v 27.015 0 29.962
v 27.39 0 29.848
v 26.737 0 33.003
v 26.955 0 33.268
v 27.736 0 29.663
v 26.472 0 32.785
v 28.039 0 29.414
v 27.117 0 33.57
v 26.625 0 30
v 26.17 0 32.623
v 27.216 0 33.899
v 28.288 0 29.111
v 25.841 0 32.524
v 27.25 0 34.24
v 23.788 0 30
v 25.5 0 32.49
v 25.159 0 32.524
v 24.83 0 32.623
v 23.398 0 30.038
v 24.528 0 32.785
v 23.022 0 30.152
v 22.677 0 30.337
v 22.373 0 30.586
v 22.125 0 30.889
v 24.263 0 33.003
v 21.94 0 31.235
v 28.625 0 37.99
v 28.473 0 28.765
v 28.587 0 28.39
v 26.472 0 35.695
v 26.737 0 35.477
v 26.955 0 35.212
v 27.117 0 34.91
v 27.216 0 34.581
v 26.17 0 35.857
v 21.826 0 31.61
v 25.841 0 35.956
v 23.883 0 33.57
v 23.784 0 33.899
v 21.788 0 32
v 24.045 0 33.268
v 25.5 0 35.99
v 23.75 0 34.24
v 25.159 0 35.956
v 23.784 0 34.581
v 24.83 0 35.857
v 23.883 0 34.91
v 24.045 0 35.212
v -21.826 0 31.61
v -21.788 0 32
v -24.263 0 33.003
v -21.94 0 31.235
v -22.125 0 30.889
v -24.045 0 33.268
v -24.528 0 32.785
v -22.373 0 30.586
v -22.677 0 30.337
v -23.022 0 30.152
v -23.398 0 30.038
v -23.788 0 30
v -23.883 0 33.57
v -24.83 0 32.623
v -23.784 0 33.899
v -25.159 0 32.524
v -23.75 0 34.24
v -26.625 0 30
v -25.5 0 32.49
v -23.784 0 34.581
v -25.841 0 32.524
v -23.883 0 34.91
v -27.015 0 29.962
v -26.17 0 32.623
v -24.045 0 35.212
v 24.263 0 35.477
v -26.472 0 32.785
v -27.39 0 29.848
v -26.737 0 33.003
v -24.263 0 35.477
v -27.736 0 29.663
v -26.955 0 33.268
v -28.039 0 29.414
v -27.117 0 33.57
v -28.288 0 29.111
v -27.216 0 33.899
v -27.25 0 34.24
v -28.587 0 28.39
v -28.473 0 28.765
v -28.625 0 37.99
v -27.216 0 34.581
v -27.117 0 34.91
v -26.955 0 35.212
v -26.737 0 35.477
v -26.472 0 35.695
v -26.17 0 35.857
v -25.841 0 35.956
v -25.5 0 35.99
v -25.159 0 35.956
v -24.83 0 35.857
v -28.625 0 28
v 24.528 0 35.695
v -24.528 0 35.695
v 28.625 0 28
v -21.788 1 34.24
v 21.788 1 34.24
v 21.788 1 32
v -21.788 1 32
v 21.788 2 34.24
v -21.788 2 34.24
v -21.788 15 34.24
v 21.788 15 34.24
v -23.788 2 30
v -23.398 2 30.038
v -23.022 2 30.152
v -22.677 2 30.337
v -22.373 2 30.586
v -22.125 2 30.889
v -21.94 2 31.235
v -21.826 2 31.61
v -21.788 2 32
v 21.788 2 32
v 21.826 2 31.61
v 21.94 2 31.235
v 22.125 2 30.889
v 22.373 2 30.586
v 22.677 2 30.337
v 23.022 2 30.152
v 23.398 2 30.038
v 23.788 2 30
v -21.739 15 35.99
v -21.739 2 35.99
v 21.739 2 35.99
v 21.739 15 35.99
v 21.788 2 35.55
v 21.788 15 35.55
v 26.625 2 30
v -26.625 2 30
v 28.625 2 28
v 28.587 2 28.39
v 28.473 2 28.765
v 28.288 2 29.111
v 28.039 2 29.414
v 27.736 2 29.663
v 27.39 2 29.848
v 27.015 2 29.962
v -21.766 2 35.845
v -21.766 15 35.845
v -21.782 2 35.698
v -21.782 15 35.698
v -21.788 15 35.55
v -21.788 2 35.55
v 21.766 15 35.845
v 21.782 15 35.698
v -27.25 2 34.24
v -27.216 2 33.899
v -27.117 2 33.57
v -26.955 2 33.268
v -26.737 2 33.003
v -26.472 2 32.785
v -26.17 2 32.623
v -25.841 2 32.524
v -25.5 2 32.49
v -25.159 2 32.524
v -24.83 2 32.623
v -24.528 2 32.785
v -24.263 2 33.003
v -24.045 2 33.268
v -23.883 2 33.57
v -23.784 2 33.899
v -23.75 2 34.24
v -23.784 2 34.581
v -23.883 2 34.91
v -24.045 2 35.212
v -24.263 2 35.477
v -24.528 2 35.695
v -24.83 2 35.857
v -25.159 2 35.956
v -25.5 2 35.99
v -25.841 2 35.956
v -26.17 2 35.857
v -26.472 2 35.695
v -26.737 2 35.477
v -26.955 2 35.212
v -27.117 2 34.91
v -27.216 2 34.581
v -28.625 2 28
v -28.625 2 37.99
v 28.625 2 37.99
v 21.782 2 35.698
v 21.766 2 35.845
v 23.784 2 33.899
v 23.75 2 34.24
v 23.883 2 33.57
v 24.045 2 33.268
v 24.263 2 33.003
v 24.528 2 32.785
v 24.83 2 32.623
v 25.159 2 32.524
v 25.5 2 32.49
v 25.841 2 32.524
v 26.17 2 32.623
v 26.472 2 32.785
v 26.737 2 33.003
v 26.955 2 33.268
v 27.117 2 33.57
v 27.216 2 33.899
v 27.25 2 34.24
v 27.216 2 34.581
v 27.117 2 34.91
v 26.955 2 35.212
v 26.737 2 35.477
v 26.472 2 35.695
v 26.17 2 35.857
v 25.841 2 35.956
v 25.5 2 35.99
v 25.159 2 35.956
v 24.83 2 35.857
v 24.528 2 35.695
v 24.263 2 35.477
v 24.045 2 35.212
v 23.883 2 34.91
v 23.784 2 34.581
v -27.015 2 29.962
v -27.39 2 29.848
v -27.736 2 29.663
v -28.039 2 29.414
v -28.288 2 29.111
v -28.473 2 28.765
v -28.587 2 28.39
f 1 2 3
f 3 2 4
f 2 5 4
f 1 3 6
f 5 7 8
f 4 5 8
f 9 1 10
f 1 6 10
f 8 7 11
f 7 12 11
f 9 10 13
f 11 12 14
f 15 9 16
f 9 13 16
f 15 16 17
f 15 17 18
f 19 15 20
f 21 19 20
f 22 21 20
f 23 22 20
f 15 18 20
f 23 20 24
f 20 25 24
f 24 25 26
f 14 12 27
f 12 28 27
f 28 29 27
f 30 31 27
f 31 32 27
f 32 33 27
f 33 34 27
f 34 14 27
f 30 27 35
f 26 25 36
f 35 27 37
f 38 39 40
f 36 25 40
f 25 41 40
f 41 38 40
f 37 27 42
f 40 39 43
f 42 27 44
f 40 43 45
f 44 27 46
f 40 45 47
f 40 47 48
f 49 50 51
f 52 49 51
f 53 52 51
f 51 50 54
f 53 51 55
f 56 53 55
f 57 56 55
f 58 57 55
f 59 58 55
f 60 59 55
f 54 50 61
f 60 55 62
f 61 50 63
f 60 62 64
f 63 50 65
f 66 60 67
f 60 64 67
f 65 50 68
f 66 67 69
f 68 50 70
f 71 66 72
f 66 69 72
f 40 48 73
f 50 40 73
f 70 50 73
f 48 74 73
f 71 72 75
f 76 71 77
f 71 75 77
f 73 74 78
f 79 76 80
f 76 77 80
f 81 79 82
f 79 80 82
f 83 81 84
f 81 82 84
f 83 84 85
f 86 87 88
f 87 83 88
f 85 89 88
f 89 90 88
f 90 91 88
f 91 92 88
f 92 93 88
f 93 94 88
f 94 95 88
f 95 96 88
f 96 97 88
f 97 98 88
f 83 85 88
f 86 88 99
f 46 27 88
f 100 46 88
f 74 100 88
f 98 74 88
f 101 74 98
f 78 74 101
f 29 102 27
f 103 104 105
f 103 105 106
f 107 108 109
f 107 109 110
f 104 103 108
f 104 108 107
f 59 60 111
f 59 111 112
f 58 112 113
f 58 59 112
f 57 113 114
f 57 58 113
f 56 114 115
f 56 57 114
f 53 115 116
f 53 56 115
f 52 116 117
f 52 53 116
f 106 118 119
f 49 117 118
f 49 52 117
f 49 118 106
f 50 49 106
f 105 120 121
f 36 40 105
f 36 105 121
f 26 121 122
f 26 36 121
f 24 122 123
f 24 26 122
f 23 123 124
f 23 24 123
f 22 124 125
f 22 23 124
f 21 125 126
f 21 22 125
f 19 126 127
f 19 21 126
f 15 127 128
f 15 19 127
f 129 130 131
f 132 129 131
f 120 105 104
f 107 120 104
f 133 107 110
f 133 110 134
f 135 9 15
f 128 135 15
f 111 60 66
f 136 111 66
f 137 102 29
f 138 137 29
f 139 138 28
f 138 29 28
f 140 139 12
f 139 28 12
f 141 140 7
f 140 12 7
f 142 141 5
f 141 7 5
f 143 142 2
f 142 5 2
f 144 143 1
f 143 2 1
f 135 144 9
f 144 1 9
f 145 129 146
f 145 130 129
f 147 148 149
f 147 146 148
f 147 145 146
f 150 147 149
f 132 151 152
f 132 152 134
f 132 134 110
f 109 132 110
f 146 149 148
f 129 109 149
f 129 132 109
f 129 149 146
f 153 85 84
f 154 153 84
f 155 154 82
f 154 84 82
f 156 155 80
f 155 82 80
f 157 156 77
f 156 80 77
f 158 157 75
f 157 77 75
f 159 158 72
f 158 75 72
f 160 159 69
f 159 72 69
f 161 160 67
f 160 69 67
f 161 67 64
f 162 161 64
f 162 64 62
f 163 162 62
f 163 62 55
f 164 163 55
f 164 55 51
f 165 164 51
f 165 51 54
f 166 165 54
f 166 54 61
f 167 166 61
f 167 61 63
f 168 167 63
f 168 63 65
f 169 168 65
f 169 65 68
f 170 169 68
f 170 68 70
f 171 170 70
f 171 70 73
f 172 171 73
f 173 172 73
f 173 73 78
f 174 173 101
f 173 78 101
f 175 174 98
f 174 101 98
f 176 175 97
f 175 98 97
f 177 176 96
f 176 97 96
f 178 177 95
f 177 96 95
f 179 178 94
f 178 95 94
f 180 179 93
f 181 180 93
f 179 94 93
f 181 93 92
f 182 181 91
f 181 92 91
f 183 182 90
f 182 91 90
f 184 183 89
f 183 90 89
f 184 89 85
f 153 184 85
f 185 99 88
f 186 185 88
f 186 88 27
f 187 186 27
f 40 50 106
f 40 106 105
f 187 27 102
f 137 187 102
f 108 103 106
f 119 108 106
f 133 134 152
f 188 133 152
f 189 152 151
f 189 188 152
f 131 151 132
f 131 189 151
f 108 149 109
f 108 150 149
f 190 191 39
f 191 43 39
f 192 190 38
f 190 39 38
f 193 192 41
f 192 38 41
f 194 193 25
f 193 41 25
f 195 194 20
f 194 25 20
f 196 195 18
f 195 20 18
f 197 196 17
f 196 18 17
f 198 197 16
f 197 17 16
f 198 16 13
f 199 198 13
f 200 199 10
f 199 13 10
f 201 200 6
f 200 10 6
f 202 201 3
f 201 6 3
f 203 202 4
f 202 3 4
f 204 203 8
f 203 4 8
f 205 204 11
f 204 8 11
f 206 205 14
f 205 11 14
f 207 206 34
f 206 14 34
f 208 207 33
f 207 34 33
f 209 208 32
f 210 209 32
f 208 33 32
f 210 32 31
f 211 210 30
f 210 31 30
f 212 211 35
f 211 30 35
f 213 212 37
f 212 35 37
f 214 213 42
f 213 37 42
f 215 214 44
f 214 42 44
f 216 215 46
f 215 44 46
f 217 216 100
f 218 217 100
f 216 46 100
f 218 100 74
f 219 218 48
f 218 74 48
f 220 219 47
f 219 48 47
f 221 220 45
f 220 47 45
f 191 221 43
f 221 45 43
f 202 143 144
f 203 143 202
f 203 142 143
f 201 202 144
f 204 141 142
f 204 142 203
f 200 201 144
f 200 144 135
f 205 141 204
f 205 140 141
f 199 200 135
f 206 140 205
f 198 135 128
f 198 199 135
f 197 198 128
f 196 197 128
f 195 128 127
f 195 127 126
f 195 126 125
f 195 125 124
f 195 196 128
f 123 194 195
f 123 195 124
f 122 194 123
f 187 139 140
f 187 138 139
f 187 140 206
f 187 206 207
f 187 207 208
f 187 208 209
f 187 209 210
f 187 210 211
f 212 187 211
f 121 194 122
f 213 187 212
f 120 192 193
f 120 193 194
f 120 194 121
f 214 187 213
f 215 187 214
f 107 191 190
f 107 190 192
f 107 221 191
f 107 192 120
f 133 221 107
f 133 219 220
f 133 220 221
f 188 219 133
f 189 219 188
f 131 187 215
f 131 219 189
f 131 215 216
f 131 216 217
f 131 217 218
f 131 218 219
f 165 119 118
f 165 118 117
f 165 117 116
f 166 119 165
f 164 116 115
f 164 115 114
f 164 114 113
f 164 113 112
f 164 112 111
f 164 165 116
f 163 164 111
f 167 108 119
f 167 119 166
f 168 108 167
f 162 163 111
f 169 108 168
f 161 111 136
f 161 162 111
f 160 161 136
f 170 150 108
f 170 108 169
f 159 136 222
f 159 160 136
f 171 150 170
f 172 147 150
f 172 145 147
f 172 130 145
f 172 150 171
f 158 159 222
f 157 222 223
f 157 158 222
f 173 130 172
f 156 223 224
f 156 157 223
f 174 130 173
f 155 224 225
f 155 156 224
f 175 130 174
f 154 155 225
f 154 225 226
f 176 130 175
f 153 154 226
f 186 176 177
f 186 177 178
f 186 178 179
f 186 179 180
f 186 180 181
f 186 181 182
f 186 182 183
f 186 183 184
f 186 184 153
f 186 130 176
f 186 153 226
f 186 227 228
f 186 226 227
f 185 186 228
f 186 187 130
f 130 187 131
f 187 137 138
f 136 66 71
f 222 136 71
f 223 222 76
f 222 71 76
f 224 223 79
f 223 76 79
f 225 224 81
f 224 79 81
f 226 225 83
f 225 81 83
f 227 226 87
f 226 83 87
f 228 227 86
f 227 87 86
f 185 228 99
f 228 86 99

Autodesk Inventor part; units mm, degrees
ref_plane "YZ Plane" through (0, 0, 0) normal (1, 0, 0) x (0, 1, 0)
ref_plane "XZ Plane" through (0, 0, 0) normal (0, 1, 0) x (-1, 0, 0)
ref_plane "XY Plane" through (0, 0, 0) normal (0, 0, 1) x (1, 0, 0)
sketch "Sketch1" plane through (0, 0, 0) normal (0, 1, 0) x (-1, 0, 0)
  circle A0 centre (25.5, 34.24) radius 1.75
  circle A1 centre (-25.5, 34.24) radius 1.75
  line L0 (23.7877, 30) -> (26.625, 30)
  arc A2 (21.7877, 32) -> (23.7877, 30) centre (23.7877, 32) ccw
  line L1 (21.7877, 35.55) -> (21.7877, 32)
  arc A3 (21.7877, 35.55) -> (21.7387, 35.99) centre (19.7877, 35.55) ccw
  arc A4 (28.625, 28) -> (26.625, 30) centre (26.625, 28) ccw
  line L2 (-21.7877, 32) -> (-21.7877, 35.55)
  arc A5 (-21.7387, 35.99) -> (-21.7877, 35.55) centre (-19.7877, 35.55) ccw
  arc A6 (-23.7877, 30) -> (-21.7877, 32) centre (-23.7877, 32) ccw
  line L3 (-26.625, 30) -> (-23.7877, 30)
  arc A7 (-26.625, 30) -> (-28.625, 28) centre (-26.625, 28) ccw
  line L4 (28.625, 28) -> (28.625, 35.99)
  line L5 (-28.625, 28) -> (-28.625, 35.99)
  line L6 (21.7877, 34.24) -> (-21.7877, 34.24)
  line L7 (28.625, 35.99) -> (-28.625, 35.99)
  line L8 (21.7877, 32) -> (-21.7877, 32)
  line L9 (-28.625, 35.99) -> (28.625, 35.99)
  line L10 (28.625, 35.99) -> (28.625, 37.99)
  line L11 (28.625, 37.99) -> (-28.625, 37.99)
  line L12 (-28.625, 37.99) -> (-28.625, 35.99)
  dimension "d6" = 2
extrude "Extrusion1" add sketch "Sketch1" along normal blind 2 contours L7 L4 A4 L0 A2 L1 A3 | A5 L2 A6 L3 A7 L5 L7
extrude "Extrusion2" add sketch "Sketch1" along normal blind 15 contours A3 L1 L6 L2 A5 L7
extrude "Extrusion3" add sketch "Sketch1" along normal blind 1 contours L1 L8 L2 L6
extrude "Extrusion4" add sketch "Sketch1" along normal blind 2 contours L7 L12 L11 L10
properties part number "pelindung uvtron"
